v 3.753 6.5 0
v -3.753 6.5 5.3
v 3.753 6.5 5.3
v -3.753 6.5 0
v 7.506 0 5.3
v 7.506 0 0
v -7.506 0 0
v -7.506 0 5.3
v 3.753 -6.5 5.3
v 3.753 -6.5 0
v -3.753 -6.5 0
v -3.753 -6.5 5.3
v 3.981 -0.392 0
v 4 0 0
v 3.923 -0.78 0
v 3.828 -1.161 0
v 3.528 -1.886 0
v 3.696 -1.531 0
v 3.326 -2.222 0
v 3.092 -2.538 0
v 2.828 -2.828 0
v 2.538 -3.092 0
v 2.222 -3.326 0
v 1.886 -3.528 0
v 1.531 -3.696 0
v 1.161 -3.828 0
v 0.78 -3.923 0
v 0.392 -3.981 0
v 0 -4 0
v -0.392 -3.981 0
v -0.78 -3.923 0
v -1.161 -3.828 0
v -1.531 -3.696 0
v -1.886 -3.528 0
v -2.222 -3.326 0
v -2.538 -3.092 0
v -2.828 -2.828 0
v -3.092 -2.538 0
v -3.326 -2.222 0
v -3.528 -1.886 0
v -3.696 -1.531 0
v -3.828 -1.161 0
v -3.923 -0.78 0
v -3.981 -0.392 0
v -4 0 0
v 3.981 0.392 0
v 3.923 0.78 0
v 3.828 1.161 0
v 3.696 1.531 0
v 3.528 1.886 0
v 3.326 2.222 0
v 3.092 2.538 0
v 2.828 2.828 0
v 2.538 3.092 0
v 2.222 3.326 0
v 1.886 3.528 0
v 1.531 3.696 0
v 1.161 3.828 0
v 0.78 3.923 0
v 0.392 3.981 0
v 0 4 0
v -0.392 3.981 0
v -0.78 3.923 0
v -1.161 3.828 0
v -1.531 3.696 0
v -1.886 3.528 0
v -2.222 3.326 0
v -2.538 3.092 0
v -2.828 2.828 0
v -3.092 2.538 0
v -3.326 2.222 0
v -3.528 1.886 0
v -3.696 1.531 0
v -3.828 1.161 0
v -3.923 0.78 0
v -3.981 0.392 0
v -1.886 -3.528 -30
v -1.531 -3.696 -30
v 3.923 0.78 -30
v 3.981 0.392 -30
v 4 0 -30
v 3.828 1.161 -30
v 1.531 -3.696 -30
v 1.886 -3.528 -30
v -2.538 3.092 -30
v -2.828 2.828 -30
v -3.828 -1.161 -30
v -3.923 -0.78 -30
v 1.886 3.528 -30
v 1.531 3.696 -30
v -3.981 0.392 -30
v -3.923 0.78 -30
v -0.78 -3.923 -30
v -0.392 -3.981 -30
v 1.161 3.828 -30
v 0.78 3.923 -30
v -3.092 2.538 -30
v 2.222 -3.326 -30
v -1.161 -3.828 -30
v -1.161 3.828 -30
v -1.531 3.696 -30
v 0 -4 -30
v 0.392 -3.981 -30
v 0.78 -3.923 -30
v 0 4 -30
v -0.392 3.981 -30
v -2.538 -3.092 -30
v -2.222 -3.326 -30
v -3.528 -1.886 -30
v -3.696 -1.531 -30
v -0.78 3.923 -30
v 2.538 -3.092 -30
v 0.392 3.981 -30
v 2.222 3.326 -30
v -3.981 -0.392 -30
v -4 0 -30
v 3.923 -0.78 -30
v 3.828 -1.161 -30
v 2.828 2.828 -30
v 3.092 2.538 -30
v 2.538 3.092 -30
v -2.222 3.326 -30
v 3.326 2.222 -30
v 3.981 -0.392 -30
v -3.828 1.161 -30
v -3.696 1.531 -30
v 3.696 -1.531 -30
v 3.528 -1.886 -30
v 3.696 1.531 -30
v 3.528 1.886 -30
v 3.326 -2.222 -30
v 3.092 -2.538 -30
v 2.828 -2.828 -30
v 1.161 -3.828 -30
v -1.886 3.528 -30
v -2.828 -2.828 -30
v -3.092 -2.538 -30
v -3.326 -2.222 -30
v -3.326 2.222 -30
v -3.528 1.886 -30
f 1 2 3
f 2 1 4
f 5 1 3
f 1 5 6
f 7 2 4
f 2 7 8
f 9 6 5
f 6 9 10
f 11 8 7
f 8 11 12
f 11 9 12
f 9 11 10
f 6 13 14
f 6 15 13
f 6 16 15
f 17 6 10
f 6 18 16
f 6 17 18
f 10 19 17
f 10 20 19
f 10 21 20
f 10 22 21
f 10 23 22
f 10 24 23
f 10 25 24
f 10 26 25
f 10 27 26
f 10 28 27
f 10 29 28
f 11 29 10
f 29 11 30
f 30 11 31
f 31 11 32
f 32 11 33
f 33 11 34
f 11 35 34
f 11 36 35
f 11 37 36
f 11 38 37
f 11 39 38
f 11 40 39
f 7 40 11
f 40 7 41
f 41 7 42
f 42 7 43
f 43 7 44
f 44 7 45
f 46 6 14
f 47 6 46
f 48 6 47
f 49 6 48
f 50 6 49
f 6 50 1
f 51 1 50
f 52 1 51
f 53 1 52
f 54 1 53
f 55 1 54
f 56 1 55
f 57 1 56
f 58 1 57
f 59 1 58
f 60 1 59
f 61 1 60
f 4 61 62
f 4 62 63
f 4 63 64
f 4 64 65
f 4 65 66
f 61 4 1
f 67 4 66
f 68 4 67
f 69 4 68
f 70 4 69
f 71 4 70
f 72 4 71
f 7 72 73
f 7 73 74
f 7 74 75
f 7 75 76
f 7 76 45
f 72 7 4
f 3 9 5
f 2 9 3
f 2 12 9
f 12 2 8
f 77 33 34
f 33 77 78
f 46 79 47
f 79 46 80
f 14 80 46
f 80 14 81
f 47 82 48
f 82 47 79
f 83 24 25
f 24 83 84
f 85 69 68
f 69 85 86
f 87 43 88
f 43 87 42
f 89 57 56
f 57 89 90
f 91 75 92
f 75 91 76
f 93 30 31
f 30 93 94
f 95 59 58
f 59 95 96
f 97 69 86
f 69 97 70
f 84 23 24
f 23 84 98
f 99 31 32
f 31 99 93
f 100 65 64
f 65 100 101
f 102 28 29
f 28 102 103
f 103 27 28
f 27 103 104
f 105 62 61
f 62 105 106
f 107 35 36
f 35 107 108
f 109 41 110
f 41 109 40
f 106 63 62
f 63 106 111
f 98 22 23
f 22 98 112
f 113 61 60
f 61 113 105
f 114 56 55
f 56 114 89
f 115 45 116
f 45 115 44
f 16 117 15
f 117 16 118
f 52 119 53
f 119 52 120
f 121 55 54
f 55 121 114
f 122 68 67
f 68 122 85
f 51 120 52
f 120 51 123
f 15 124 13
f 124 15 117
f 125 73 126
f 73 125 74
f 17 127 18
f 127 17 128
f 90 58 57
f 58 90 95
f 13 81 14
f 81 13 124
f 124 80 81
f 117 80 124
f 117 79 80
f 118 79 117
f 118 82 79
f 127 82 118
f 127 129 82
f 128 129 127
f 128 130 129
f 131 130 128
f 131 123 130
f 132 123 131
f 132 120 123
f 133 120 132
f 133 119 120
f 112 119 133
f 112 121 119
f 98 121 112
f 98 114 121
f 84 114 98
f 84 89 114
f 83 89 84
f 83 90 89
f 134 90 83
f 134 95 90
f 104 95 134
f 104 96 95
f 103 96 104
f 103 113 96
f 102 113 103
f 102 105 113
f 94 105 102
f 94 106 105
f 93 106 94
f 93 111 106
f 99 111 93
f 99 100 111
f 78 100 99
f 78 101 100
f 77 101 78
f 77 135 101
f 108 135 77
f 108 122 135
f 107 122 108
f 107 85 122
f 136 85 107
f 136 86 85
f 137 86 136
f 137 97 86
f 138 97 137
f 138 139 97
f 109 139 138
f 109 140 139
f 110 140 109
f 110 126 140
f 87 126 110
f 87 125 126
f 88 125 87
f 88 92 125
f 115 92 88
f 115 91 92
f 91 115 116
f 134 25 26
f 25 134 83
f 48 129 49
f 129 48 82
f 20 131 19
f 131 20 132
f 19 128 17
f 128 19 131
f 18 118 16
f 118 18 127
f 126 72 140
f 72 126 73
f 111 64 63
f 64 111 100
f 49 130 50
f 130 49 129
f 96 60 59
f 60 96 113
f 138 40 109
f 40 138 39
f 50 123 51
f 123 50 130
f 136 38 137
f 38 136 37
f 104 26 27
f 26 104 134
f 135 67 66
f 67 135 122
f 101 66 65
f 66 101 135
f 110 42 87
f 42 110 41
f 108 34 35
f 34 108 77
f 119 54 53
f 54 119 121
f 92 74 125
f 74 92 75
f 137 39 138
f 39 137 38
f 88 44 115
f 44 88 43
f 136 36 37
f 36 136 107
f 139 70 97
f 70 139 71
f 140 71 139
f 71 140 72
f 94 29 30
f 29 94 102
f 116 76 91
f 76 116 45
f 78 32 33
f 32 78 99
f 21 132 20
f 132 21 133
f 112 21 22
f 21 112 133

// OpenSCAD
// M8 hex bolt (simplified: no threads, cylindrical shank)
// Head: hexagonal prism, across-flats = 13 mm, height = 5.3 mm
// Shank: cylinder, diameter = 8 mm, length = 30 mm
// Head bottom at z = 0, shank extends to z < 0, central axis along +Z

$fn = 64; // smooth cylinder

module hex_head(across_flats = 13, height = 5.3) {
    // For a regular hexagon: across_flats = R * sqrt(3)  => circumradius R = across_flats / sqrt(3)
    R = across_flats / sqrt(3);
    // Create a 6-sided regular polygon with circumradius R, centered at origin
    linear_extrude(height = height, center = false, convexity = 10)
        polygon(points = [ for(i = [0:5]) let(a = i*360/6) [ R*cos(a), R*sin(a) ] ]);
}

module shank(diameter = 8, length = 30) {
    // Cylinder with top at z = 0, extending to negative z
    translate([0,0,-length]) // move base to z = -length
        translate([0,0,0]) // ensures top at z=0 after cylinder creation
            cylinder(h = length, d = diameter, center = false);
}

// Assemble: head from z=0 up, shank from z=0 down
union() {
    // Head: bottom at z = 0
    translate([0,0,0]) hex_head(13, 5.3);
    // Shank: top at z = 0, extends to z = -30
    shank(8, 30);
}

// Optional: create a module and call it (already assembled above)
// bolt();
